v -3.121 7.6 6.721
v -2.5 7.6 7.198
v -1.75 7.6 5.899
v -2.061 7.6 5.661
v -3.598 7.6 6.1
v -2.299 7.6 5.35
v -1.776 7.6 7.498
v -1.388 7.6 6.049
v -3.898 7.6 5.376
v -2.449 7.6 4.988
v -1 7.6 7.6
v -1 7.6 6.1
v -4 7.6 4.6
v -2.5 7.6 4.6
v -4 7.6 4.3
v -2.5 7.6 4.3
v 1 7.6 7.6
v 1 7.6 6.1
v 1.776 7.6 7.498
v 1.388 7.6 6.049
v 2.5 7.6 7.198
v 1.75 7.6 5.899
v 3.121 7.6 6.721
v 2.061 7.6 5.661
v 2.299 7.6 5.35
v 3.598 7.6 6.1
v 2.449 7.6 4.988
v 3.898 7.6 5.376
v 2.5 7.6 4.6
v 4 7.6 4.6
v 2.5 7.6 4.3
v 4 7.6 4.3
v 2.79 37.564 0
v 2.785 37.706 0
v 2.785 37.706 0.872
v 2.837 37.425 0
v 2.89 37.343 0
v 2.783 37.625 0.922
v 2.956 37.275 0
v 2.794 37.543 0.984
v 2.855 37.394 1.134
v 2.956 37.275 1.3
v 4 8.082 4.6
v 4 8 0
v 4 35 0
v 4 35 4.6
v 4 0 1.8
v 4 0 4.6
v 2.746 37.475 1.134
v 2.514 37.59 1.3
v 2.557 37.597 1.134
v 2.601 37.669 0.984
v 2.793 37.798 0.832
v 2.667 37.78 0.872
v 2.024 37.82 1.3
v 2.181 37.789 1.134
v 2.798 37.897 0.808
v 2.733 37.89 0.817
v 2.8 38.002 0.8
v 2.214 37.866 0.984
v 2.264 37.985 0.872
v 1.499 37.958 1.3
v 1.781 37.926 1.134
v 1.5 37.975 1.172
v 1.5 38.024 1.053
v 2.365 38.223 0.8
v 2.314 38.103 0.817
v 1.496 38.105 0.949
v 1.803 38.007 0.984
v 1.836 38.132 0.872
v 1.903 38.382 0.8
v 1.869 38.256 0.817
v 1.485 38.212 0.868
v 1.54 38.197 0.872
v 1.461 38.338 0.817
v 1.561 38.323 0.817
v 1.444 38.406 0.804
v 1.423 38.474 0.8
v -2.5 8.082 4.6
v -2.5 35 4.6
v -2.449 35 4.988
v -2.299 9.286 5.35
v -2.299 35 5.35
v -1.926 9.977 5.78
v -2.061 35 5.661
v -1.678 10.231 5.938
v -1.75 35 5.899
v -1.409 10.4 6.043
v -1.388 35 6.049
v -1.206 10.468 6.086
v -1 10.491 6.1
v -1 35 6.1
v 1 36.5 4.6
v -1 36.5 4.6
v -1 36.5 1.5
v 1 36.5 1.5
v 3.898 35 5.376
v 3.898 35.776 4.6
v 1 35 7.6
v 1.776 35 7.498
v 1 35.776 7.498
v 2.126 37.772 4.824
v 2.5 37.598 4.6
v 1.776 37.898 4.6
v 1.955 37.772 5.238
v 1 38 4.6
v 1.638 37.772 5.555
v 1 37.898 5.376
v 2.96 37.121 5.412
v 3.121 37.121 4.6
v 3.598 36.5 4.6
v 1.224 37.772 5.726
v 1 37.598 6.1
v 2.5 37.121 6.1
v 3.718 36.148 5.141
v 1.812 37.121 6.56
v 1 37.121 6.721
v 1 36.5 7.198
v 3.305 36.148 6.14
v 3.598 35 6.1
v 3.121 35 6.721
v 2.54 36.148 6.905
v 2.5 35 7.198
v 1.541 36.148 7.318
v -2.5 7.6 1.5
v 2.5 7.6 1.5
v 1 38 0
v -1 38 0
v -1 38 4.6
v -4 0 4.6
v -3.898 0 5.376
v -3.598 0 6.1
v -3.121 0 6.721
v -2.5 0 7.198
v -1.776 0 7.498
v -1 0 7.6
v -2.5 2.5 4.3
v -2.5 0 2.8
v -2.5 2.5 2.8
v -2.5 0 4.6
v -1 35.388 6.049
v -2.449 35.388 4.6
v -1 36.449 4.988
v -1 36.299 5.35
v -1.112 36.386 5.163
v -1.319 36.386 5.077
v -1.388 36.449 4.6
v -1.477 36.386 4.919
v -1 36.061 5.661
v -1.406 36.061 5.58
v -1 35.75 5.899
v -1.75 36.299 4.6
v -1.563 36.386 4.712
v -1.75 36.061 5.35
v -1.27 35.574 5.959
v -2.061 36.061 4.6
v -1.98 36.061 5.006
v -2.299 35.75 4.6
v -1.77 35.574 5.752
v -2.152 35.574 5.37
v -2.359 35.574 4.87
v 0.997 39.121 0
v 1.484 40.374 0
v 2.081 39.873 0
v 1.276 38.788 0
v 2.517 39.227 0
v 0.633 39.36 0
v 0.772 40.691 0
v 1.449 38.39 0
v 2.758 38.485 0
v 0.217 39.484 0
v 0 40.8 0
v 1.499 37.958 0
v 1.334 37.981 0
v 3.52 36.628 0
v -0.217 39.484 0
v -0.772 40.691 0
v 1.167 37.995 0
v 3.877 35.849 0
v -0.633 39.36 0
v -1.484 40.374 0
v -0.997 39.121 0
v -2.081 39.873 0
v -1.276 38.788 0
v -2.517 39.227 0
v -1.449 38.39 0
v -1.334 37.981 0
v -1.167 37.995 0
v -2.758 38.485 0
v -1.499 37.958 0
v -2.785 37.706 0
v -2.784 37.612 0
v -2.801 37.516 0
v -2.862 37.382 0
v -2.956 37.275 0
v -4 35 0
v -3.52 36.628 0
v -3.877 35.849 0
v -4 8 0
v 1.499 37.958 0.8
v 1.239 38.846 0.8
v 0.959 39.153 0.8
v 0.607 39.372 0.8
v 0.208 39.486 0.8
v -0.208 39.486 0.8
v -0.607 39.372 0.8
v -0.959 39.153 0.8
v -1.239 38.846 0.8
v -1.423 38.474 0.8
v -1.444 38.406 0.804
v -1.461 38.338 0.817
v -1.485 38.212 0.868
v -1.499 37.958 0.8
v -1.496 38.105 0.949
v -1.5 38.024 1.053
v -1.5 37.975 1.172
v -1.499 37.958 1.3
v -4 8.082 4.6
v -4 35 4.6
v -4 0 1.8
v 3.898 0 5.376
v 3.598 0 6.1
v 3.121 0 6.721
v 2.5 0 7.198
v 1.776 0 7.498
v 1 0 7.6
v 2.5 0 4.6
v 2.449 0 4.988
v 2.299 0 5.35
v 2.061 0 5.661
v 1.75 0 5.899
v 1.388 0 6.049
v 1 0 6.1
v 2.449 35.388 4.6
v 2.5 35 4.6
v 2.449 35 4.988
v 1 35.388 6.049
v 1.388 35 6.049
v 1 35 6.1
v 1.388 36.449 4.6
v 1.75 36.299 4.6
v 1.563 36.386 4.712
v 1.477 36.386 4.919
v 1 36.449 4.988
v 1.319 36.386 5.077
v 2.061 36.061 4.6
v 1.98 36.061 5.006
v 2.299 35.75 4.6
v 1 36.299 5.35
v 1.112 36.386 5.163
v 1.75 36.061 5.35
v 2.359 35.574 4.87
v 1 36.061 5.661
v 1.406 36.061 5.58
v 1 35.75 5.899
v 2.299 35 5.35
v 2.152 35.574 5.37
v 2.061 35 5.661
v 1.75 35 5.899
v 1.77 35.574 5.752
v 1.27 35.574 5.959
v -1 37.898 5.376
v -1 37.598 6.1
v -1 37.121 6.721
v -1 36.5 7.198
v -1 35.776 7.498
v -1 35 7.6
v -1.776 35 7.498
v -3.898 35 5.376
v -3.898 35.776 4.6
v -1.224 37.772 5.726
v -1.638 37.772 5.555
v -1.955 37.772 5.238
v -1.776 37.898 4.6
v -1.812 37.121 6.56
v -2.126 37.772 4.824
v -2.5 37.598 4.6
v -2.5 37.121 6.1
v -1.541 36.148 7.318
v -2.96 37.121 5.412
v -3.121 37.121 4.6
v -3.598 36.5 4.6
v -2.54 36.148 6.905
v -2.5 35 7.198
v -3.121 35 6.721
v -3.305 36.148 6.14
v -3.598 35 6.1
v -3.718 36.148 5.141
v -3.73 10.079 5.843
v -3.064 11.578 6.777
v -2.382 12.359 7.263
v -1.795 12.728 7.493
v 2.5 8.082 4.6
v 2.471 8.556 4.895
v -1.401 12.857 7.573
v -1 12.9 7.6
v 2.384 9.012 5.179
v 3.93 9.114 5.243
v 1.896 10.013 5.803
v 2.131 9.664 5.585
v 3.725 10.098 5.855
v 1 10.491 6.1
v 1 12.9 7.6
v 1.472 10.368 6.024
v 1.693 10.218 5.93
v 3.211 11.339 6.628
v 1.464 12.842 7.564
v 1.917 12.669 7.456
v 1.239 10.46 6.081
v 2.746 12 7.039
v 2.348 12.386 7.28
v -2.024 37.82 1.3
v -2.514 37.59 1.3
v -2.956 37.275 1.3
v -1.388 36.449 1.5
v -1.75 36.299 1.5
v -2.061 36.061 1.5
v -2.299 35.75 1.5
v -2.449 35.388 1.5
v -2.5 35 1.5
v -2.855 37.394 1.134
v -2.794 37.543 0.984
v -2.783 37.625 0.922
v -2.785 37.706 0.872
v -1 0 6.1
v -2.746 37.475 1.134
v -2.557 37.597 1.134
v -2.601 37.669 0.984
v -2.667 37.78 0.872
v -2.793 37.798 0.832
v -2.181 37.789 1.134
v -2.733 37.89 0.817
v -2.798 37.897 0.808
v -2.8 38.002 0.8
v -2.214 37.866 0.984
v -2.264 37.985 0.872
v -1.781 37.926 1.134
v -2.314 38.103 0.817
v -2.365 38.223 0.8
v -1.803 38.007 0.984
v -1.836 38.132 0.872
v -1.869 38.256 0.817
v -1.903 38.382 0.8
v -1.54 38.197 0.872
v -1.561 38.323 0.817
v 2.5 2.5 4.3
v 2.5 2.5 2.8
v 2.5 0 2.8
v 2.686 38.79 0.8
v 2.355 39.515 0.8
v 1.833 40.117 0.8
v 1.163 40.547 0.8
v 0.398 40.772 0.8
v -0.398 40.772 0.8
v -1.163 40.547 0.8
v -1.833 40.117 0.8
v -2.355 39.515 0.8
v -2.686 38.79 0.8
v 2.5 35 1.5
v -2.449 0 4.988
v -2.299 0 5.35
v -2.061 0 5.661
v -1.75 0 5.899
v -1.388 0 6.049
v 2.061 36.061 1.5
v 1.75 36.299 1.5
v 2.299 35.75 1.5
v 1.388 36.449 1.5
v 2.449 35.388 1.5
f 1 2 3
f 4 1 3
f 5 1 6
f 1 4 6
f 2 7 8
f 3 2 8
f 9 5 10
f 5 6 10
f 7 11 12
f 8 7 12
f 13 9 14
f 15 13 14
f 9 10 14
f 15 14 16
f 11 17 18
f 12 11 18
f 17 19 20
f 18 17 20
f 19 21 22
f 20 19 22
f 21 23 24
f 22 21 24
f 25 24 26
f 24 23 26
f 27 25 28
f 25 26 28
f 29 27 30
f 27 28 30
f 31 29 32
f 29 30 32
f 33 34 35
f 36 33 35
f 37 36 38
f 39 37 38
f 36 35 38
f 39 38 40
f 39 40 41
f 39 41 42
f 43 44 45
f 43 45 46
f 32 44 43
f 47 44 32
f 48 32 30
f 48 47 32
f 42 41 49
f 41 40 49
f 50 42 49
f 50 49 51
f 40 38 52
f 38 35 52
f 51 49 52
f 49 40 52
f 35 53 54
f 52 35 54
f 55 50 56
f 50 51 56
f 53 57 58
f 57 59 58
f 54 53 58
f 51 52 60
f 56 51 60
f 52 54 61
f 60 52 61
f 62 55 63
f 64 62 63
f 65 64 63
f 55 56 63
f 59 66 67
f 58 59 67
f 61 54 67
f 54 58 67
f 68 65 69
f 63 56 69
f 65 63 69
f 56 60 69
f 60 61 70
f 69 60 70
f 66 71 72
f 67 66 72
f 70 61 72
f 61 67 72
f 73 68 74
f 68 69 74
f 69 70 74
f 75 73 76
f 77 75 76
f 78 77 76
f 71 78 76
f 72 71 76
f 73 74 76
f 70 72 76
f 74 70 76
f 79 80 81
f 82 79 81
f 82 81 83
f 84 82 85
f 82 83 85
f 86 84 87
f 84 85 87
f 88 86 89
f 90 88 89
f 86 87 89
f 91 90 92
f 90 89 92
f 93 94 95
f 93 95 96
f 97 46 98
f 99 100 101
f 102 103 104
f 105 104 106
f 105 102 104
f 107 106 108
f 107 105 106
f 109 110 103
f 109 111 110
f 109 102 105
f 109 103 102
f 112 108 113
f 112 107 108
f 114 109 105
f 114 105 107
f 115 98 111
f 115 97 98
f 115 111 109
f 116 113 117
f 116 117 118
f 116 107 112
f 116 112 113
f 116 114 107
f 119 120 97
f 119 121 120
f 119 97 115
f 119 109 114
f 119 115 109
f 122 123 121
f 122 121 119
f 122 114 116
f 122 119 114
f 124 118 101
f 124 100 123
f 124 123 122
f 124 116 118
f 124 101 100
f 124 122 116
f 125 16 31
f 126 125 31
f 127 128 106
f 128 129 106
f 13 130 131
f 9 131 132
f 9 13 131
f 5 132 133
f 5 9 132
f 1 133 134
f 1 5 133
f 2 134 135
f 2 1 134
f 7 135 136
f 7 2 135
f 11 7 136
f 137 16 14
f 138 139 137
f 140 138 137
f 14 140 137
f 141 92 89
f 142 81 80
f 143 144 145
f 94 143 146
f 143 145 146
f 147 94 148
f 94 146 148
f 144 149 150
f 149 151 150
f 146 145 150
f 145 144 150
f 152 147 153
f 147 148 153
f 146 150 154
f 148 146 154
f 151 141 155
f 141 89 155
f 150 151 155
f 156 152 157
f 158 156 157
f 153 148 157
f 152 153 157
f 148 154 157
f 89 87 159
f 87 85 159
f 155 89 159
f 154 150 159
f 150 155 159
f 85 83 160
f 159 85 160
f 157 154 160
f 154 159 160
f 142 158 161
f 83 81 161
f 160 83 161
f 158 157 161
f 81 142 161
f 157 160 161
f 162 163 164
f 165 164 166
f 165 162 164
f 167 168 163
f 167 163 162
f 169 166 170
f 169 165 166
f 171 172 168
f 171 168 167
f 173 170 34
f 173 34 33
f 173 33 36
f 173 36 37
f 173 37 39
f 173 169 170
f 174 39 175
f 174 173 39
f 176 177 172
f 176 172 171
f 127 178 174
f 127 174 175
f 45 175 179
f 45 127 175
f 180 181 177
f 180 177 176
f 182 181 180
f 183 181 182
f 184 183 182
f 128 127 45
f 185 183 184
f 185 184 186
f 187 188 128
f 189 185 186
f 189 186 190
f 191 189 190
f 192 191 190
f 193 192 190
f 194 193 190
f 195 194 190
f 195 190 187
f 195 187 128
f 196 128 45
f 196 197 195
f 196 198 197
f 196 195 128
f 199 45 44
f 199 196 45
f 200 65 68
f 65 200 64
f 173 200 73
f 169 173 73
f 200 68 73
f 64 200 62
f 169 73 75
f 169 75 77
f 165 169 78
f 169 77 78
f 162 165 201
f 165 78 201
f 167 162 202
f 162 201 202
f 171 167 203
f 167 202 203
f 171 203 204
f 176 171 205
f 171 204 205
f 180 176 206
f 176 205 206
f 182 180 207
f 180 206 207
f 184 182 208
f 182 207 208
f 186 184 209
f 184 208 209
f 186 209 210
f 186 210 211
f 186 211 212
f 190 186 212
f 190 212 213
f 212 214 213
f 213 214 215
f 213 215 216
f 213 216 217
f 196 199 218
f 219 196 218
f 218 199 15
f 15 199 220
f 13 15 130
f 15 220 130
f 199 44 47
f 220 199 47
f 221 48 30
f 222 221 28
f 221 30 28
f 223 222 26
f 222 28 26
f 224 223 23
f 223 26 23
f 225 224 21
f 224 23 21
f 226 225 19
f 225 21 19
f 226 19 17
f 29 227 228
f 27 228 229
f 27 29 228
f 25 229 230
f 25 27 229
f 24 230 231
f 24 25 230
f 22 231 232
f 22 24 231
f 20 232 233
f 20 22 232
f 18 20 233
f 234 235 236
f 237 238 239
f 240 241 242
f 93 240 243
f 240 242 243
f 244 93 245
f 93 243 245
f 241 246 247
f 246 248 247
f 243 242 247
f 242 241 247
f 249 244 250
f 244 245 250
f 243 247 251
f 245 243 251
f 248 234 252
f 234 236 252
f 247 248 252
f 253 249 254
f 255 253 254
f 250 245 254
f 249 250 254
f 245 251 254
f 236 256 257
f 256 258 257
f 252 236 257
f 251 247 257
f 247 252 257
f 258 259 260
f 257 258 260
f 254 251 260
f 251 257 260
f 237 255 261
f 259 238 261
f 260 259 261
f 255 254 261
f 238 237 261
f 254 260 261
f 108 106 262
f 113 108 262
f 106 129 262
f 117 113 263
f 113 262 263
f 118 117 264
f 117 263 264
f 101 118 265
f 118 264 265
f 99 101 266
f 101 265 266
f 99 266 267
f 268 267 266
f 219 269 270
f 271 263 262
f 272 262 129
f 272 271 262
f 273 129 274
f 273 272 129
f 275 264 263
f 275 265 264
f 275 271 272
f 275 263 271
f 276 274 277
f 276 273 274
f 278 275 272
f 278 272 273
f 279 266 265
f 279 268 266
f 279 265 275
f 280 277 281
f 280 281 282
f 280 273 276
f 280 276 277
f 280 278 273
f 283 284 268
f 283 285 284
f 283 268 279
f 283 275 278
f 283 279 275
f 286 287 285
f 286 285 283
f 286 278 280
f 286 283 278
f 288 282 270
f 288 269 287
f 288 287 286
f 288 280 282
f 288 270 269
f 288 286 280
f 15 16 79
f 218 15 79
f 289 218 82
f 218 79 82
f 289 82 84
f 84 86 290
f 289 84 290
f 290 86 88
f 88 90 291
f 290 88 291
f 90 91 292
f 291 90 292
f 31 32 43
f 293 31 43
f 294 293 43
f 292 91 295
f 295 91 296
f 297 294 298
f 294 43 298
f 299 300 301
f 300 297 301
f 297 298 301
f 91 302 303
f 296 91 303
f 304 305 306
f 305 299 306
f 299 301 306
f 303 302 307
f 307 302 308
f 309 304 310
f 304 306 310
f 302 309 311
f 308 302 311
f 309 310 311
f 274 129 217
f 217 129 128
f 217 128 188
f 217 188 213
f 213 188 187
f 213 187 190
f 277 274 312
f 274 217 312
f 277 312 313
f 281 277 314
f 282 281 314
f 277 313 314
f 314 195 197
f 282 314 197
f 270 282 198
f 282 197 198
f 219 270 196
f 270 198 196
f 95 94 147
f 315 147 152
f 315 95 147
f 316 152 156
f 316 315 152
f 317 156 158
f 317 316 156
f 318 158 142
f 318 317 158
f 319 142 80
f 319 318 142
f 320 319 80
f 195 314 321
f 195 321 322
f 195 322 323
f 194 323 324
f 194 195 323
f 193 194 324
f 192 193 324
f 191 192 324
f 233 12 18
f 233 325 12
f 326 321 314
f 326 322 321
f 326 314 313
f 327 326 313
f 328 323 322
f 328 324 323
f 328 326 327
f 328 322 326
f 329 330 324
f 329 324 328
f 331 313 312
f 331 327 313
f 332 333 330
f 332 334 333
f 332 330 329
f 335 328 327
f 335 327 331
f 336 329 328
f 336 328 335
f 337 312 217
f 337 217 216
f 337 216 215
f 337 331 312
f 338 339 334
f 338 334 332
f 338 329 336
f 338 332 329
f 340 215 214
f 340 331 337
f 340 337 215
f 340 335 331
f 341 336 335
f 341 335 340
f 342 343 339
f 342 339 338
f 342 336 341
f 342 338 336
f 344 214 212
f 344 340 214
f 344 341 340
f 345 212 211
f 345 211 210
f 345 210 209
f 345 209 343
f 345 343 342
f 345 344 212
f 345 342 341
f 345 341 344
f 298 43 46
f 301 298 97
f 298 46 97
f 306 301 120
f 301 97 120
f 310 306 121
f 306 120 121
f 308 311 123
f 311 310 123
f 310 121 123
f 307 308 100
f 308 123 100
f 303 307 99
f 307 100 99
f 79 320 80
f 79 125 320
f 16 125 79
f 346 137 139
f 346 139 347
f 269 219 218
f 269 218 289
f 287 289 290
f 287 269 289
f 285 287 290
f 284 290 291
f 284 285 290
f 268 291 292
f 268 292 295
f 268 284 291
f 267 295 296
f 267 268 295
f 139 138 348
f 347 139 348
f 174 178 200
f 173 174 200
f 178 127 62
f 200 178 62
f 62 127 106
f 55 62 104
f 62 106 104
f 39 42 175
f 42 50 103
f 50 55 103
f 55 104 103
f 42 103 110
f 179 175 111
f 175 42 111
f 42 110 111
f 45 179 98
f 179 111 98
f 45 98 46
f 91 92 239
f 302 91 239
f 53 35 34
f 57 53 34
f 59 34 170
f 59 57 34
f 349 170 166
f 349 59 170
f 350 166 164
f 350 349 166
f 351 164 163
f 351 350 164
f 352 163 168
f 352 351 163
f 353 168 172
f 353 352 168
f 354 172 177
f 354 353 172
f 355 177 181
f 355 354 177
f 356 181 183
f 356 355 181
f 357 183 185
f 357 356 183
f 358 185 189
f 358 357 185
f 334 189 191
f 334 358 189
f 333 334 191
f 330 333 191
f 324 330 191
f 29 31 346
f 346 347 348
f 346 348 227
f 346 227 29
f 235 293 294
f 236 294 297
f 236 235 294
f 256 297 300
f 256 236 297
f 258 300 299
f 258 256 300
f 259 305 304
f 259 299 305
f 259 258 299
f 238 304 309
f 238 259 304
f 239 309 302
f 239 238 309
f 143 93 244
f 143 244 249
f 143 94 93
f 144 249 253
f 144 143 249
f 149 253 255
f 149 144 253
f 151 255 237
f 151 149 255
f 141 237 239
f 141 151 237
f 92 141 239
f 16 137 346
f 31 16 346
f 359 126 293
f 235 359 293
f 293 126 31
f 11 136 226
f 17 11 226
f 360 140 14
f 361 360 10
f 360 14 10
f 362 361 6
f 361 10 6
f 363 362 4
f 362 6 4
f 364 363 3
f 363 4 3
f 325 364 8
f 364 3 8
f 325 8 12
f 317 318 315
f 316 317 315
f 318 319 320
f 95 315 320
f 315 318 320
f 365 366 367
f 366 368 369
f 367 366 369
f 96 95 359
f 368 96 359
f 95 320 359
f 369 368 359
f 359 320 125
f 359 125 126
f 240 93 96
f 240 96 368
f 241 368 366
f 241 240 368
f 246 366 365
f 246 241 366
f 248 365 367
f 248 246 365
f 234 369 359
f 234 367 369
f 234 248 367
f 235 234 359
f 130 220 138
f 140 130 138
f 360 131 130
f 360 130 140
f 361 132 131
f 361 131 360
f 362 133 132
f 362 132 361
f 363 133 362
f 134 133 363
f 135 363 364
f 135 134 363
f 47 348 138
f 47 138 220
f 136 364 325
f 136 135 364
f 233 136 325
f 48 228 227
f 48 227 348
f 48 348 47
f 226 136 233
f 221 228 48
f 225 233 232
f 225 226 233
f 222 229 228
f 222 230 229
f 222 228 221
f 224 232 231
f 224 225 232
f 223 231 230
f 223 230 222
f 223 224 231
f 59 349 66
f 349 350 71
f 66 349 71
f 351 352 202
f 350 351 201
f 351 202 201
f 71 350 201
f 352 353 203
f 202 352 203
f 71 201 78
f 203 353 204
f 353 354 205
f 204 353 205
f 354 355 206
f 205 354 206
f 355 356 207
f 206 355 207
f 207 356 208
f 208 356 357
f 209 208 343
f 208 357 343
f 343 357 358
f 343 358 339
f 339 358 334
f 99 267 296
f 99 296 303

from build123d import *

# Parameters (mm, degrees)
F0_W      = 8
F0_H      = 7.6
F1_DEPTH  = 38
F2_R      = 3
F3_R      = 3
F4_T      = -1.5
F5_W      = 8
F5_H      = 4.3
F6_DEPTH  = 7.6
F8_DEPTH  = 8.001
F9_W      = 5
F9_H      = 1.5
F10_DEPTH = 2.5
F12_DEPTH = 25
F14_W     = 1.3
F14_H     = 0.8
F16_R     = 0.5


with BuildPart() as f1:
    # F0 (on Front) → F1 (new body)
    with BuildSketch(Plane.XZ):
        with Locations((0, 3.8)):
            Rectangle(F0_W, F0_H)
    extrude(amount=-F1_DEPTH)

    # F2
    f2_edges = [f1.edges().sort_by_distance(p)[0] for p in [
        (4, 19, 7.6),
        (-4, 19, 7.6),
    ]]
    fillet(f2_edges, radius=F2_R)

    # F3
    f3_edges = [f1.edges().sort_by_distance(p)[0] for p in [
        (4, 38, 2.3),
    ]]
    fillet(f3_edges, radius=F3_R)

    # F4
    f4_openings = [f1.faces().sort_by_distance(p)[0] for p in [
        (0, 0, 3.587656),
    ]]
    offset(amount=F4_T, openings=f4_openings)

    # F5 (on face) → F6 (join)
    with BuildSketch(Plane.XZ):
        with Locations((0, 2.15)):
            Rectangle(F5_W, F5_H)
    extrude(amount=-F6_DEPTH)

    # F7 (on face) → F8 (cut, through all)
    with BuildSketch(Plane.YZ.offset(4)):
        Polygon((7.6, 7.6), (7.6, 4.3), (12.9, 7.6), align=None)
    extrude(amount=-F8_DEPTH, mode=Mode.SUBTRACT)

    # F9 (on face) → F10 (cut)
    with BuildSketch(Plane.XZ):
        with Locations((0, 3.55)):
            Rectangle(F9_W, F9_H)
    extrude(amount=-F10_DEPTH, mode=Mode.SUBTRACT)

    # F11 (on face) → F12 (cut)
    with BuildSketch(Plane.YZ.offset(4)):
        Polygon((8, 0), (0, 1.8), (0, 0), align=None)
    extrude(amount=-F12_DEPTH, mode=Mode.SUBTRACT)

    # F14 (on Right) → F15 (revolve)
    with BuildSketch(Plane.YZ):
        with Locations((40.15, 0.4)):
            Rectangle(F14_W, F14_H)
    revolve(axis=Axis((0, 38, 2.3), (0, 0, 1)))

    # F16
    f16_edges = [f1.edges().sort_by_distance(p)[0] for p in [
        (2.150942, 37.770439, 0.8),
        (-2.150942, 37.770439, 0.8),
        (2.743679, 37.441226, 0.4),
        (-2.743679, 37.441226, 0.4),
    ]]
    fillet(f16_edges, radius=F16_R)


solid = f1.part
